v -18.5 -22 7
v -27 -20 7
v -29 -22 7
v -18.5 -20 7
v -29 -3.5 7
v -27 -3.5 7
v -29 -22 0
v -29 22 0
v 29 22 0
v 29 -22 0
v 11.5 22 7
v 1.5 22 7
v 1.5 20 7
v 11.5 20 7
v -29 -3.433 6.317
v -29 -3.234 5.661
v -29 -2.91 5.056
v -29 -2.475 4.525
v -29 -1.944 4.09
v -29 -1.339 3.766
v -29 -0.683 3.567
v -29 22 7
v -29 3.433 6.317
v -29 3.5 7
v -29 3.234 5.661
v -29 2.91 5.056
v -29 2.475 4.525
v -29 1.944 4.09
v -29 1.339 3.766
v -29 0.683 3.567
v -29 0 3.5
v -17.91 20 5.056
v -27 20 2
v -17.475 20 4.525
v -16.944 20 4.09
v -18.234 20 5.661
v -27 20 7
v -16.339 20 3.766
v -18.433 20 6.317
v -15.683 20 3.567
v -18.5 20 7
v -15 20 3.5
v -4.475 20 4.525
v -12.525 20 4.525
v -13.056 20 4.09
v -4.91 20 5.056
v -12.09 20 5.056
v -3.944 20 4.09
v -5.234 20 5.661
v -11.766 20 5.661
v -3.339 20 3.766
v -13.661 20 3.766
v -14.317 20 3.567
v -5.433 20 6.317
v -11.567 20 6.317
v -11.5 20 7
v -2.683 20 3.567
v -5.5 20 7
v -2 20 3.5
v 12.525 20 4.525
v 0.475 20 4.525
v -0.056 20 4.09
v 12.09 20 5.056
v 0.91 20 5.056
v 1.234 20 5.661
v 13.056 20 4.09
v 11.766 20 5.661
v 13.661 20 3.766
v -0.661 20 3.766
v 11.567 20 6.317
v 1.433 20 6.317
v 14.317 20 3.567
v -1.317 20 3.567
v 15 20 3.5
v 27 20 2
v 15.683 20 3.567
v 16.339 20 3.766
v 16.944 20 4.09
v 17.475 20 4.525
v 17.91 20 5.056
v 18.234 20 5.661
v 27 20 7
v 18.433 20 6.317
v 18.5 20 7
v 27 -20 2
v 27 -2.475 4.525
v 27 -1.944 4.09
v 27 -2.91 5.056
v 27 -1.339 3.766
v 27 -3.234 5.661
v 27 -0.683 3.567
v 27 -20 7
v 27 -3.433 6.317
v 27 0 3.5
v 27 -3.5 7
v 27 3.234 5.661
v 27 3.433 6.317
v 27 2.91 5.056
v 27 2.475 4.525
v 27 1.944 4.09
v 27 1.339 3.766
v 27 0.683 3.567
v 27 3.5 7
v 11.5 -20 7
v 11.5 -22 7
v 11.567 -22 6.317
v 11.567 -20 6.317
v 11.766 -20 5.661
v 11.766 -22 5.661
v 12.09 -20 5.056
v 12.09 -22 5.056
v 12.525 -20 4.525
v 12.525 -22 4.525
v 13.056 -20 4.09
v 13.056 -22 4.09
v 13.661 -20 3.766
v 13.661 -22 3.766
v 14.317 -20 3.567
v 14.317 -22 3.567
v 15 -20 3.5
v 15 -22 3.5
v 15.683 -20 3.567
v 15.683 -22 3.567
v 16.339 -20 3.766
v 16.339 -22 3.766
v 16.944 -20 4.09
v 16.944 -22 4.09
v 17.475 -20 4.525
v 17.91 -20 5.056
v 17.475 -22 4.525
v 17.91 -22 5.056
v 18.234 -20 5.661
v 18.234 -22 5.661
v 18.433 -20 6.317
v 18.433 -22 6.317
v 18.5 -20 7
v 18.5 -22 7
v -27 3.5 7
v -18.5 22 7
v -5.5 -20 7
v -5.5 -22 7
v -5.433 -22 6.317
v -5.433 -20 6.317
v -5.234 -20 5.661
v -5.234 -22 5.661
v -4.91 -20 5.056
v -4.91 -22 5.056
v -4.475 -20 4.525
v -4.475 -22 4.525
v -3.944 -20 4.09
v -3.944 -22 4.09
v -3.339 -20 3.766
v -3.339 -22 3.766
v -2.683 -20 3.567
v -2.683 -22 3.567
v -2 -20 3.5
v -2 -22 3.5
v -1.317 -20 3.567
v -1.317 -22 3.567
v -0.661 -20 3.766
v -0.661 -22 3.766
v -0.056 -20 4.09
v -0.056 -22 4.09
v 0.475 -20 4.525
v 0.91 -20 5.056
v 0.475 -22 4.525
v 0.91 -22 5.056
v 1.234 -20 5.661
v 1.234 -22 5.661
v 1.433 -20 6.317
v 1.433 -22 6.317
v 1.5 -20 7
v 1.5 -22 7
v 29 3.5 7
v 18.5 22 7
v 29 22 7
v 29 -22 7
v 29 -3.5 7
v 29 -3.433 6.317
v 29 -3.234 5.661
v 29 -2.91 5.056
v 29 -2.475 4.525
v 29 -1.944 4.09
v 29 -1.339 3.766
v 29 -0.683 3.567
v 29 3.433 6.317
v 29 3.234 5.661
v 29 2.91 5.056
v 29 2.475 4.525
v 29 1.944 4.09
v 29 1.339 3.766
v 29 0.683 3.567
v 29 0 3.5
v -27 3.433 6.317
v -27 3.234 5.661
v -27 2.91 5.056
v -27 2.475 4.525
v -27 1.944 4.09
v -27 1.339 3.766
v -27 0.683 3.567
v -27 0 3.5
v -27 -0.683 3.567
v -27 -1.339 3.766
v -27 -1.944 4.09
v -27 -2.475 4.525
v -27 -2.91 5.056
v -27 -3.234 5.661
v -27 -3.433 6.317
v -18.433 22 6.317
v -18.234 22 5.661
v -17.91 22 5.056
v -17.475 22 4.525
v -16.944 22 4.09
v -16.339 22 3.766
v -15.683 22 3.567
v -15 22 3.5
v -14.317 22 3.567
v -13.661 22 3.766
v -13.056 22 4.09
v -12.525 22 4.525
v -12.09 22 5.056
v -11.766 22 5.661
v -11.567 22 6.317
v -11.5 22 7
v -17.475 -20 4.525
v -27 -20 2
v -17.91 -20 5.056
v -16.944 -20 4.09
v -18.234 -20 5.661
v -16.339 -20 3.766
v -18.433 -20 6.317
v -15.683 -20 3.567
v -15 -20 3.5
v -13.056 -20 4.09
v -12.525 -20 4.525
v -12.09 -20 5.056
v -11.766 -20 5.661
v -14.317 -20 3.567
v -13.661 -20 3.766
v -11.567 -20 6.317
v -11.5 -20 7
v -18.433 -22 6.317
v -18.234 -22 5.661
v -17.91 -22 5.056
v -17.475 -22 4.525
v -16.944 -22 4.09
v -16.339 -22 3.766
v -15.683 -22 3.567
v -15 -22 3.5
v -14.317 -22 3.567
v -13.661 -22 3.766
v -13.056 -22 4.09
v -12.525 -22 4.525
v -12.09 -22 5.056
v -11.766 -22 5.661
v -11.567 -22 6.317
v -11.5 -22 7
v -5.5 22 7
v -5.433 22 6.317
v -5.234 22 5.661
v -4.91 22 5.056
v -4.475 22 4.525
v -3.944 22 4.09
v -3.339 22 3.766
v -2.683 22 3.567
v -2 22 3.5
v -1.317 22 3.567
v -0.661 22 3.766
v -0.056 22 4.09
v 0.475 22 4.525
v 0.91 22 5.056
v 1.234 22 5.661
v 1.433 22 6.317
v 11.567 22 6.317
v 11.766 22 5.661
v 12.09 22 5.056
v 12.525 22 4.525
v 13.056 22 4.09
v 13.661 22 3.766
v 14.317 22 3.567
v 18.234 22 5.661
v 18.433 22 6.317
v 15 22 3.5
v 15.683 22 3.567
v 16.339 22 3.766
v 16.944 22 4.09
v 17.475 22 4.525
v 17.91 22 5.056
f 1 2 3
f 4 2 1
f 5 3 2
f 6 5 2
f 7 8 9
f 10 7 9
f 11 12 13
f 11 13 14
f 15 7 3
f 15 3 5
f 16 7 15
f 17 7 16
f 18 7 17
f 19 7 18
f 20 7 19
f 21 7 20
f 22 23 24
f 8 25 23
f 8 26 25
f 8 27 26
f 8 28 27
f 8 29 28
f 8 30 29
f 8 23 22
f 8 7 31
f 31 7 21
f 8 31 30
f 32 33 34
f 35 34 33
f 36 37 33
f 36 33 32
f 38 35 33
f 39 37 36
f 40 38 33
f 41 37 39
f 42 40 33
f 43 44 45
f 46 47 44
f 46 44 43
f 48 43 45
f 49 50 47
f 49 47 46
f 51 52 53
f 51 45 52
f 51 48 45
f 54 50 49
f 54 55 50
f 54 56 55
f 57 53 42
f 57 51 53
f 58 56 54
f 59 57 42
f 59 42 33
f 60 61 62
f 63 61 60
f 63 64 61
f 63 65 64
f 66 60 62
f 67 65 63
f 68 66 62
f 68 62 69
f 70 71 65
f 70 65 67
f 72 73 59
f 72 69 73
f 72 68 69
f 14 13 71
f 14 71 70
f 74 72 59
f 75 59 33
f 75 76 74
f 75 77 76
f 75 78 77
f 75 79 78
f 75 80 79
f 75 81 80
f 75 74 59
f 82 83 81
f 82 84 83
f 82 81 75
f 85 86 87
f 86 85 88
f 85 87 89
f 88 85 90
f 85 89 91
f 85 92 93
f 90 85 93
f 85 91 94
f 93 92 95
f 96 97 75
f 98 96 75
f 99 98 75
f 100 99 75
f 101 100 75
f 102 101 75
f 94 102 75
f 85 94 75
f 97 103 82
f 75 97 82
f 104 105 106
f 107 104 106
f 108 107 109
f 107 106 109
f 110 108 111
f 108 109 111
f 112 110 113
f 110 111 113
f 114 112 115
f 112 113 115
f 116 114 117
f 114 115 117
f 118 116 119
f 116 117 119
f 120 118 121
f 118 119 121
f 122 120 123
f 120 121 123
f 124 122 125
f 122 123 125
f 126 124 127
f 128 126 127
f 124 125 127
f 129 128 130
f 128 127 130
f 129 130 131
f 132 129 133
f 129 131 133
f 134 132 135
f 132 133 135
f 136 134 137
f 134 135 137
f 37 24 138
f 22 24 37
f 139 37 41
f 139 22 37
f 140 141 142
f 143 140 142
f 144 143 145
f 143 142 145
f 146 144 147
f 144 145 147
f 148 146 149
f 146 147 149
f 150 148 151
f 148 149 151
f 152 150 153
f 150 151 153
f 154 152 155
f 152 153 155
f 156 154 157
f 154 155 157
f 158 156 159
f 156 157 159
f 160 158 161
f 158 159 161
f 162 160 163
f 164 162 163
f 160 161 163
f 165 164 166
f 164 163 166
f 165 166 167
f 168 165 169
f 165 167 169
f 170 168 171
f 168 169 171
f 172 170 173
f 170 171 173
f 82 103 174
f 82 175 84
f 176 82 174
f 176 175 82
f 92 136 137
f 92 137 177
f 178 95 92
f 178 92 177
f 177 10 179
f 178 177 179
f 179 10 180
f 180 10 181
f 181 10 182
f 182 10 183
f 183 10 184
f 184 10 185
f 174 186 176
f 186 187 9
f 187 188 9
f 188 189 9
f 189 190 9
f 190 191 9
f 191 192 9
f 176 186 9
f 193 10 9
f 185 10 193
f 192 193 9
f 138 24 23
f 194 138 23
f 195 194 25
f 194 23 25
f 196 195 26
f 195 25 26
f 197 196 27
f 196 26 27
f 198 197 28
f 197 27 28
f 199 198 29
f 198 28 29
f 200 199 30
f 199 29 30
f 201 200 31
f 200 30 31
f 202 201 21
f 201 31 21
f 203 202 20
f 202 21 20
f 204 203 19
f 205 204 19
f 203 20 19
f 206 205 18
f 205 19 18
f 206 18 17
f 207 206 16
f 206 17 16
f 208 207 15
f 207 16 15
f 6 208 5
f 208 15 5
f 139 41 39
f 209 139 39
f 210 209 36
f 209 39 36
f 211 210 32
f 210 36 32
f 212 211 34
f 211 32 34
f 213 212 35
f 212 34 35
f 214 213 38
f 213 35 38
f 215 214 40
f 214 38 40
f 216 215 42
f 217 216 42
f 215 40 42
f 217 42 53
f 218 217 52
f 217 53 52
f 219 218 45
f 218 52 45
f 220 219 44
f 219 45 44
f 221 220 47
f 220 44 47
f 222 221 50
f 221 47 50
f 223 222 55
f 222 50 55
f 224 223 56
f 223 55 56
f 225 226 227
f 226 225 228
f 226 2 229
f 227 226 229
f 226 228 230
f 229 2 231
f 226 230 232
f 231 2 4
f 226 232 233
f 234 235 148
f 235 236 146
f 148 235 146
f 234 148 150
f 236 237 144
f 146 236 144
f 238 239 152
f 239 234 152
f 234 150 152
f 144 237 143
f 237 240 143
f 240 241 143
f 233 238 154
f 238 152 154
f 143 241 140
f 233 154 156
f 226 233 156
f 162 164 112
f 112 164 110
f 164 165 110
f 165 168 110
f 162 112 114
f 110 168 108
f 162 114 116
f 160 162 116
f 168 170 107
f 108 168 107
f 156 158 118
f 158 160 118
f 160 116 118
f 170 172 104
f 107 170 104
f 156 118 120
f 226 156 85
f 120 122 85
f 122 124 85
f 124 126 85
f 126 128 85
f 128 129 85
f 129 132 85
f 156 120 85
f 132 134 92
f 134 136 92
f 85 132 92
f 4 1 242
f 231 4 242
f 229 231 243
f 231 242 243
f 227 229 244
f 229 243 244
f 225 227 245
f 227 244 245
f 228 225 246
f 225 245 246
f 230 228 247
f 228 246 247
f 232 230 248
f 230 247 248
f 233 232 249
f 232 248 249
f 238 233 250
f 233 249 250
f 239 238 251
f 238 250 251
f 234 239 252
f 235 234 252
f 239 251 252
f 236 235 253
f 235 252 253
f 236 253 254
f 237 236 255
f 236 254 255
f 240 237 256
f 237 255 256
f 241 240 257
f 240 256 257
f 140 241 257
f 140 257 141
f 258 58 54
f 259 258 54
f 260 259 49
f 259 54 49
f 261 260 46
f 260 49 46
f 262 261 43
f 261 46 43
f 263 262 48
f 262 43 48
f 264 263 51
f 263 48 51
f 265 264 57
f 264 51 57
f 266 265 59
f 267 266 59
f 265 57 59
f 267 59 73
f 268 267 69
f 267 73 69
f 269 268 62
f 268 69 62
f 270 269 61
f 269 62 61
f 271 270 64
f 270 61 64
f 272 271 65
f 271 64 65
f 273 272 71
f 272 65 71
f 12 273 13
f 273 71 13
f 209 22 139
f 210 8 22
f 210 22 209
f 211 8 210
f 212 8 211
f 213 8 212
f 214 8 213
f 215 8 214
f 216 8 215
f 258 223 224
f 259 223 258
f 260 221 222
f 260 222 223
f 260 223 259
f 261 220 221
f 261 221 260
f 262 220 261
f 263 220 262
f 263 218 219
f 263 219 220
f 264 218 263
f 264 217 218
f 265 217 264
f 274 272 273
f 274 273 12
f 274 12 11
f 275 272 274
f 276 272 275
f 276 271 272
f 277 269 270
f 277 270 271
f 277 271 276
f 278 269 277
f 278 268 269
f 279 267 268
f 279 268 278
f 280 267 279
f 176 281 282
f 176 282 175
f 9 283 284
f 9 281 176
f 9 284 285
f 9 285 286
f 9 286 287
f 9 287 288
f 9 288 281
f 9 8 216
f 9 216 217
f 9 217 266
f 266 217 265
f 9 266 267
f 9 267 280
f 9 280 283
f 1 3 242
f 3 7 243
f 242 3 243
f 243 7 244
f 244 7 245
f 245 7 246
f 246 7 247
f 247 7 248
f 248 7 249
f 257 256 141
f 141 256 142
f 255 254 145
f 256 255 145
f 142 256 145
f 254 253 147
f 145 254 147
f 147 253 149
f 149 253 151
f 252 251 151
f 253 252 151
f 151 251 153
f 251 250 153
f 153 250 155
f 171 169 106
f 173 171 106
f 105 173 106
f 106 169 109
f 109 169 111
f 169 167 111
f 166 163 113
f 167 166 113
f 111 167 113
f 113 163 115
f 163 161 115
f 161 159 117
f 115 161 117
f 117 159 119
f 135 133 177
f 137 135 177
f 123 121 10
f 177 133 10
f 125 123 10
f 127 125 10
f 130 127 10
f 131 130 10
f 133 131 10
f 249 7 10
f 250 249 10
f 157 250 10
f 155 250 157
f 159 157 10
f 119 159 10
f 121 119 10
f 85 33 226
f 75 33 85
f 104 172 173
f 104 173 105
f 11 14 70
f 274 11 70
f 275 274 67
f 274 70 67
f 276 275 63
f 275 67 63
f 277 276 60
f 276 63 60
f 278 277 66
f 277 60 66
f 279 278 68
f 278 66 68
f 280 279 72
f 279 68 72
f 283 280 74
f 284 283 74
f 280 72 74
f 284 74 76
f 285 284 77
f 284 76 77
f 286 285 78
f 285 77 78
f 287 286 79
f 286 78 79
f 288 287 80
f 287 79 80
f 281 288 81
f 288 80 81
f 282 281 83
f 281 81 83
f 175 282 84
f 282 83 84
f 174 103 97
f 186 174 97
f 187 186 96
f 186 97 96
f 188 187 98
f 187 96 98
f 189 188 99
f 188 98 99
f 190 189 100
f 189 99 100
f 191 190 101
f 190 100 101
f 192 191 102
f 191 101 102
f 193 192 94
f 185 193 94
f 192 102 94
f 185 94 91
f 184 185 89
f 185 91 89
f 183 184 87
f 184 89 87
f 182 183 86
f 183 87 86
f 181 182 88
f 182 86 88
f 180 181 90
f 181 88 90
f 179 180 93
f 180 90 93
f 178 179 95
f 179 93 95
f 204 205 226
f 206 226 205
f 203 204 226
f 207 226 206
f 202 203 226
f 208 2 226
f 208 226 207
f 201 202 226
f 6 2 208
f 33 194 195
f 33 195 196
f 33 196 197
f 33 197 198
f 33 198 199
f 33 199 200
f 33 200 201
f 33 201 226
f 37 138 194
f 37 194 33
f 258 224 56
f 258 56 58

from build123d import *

# Parameters (mm, degrees)
F0_W     = 58
F0_H     = 44
F1_DEPTH = 7
F2_W     = 54
F2_H     = 40
F3_DEPTH = 5
F4_R     = 3.5
F5_DEPTH = 50
F6_R     = 3.5
F7_DEPTH = 60


with BuildPart() as f1:
    # F0 (on Top) → F1 (new body)
    with BuildSketch(Plane.XY):
        Rectangle(F0_W, F0_H)
    extrude(amount=F1_DEPTH)

    # F2 (on face) → F3 (cut)
    with BuildSketch(Plane.XY.offset(7)):
        Rectangle(F2_W, F2_H)
    extrude(amount=-F3_DEPTH, mode=Mode.SUBTRACT)

    # F4 (on face) → F5 (cut)
    with BuildSketch(Plane.XZ.offset(22)):
        with Locations((-15, 7)):
            Circle(F4_R)
        with Locations((-2, 7)):
            Circle(F4_R)
        with Locations((15, 7)):
            Circle(F4_R)
    extrude(amount=-F5_DEPTH, mode=Mode.SUBTRACT)

    # F6 (on face) → F7 (cut)
    with BuildSketch(Plane(origin=(-29, 0, 0), x_dir=(0, -1, 0), z_dir=(-1, 0, 0))):
        with Locations((0, 7)):
            Circle(F6_R)
    extrude(amount=-F7_DEPTH, mode=Mode.SUBTRACT)


solid = f1.part
